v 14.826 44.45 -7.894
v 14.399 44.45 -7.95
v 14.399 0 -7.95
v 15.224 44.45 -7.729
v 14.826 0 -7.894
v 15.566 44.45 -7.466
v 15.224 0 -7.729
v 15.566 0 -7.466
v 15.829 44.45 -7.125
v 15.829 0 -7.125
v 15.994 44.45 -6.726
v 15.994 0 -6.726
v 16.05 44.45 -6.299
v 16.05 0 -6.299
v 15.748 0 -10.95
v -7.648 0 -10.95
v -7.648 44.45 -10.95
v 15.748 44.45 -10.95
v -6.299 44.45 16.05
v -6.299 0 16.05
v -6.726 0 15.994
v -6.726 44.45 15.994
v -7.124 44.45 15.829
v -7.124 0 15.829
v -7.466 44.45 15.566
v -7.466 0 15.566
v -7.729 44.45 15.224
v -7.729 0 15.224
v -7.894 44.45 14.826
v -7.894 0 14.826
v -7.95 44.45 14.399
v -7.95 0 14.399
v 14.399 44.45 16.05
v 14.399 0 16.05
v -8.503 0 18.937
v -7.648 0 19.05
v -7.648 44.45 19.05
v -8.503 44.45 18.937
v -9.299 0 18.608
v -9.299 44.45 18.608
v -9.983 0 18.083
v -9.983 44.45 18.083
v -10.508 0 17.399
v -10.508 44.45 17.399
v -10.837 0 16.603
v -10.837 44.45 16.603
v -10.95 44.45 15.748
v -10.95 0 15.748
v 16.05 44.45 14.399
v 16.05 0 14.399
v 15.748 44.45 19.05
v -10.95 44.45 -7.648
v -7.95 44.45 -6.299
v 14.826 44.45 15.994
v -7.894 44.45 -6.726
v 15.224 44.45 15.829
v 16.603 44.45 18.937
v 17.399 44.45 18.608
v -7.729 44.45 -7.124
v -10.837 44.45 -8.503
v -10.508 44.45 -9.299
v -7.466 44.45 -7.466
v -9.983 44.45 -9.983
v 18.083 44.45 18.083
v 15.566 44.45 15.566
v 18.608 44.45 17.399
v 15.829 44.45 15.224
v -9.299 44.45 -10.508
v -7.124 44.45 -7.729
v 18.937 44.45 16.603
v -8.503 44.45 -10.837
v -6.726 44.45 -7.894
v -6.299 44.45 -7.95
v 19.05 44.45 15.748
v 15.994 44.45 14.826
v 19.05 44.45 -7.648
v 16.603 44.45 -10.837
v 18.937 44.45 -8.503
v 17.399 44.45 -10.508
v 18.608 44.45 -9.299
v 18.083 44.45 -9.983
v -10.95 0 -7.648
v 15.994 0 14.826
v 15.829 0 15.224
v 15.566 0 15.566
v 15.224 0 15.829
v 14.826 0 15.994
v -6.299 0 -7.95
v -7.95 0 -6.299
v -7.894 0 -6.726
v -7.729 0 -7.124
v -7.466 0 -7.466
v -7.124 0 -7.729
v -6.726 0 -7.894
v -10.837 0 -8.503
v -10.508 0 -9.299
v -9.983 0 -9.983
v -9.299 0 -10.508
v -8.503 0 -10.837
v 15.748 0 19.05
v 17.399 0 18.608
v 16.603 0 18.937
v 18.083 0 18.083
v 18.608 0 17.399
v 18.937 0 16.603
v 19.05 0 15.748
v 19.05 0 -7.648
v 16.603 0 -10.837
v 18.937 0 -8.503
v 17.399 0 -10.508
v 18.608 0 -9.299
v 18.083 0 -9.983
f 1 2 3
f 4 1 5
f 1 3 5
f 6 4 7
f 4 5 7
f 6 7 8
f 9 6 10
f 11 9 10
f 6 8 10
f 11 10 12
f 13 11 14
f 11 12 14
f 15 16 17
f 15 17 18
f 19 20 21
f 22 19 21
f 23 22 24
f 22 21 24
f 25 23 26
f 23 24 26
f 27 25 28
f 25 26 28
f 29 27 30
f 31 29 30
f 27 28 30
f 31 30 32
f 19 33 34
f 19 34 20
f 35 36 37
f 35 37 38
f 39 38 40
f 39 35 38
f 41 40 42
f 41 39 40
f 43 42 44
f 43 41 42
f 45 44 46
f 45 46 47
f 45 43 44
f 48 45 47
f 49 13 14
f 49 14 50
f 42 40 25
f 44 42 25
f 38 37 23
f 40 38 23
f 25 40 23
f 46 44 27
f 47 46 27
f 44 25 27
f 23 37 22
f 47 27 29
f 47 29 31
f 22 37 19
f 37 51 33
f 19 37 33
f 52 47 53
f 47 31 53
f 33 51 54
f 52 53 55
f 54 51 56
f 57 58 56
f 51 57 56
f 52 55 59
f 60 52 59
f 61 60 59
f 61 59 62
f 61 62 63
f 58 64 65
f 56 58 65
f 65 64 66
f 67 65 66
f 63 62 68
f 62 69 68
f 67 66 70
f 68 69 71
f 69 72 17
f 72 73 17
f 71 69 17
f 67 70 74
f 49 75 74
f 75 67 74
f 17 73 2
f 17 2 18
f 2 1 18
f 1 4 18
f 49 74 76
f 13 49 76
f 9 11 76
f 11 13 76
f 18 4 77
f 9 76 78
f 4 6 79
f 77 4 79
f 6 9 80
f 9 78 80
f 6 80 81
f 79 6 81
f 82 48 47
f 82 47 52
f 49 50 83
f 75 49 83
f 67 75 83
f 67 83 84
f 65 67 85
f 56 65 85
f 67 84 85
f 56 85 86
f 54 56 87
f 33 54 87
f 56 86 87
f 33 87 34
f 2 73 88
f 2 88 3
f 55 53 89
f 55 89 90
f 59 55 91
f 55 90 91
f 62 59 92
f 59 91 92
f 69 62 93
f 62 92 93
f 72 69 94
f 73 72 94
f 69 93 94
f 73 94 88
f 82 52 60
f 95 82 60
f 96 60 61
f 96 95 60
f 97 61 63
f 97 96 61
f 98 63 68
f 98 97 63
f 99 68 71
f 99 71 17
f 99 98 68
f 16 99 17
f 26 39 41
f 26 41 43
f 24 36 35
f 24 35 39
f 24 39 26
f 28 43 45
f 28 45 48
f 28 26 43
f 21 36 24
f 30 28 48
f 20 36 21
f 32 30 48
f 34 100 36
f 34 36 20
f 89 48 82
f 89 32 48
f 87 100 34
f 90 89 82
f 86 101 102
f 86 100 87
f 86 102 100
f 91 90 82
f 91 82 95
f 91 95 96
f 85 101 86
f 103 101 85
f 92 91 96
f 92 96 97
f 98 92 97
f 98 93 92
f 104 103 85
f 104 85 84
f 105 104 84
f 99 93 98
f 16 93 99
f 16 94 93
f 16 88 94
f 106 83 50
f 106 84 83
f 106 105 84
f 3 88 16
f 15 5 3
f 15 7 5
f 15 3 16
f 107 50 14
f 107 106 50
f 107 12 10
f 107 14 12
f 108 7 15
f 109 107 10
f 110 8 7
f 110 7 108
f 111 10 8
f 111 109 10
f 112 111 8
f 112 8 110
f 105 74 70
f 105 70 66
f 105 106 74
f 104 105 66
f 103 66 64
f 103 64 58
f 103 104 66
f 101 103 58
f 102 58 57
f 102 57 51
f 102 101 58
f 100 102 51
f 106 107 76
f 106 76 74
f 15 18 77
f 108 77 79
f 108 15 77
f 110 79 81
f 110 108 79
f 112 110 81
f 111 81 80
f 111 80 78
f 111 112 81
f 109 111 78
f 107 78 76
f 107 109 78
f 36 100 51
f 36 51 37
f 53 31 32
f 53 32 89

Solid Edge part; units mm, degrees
sketch "Sketch1" plane through (0, 0, 0) normal (0, -1, 0) x (1, 0, 0)
  line L0 (-7.95, 14.399) -> (-7.95, -6.299)
  arc A0 (-7.95, -6.299) -> (-6.299, -7.95) centre (-6.299, -6.299) ccw
  line L1 (-6.299, -7.95) -> (14.399, -7.95)
  arc A1 (14.399, -7.95) -> (16.05, -6.299) centre (14.399, -6.299) ccw
  line L2 (16.05, -6.299) -> (16.05, 14.399)
  arc A2 (16.05, 14.399) -> (14.399, 16.05) centre (14.399, 14.399) ccw
  line L3 (14.399, 16.05) -> (-6.299, 16.05)
  arc A3 (-6.299, 16.05) -> (-7.95, 14.399) centre (-6.299, 14.399) ccw
  arc A4 (-10.95, -7.648) -> (-7.648, -10.95) centre (-7.648, -7.648) ccw
  line L4 (-7.648, -10.95) -> (15.748, -10.95)
  arc A5 (15.748, -10.95) -> (19.05, -7.648) centre (15.748, -7.648) ccw
  line L5 (19.05, -7.648) -> (19.05, 15.748)
  arc A6 (19.05, 15.748) -> (15.748, 19.05) centre (15.748, 15.748) ccw
  line L6 (15.748, 19.05) -> (-7.648, 19.05)
  arc A7 (-7.648, 19.05) -> (-10.95, 15.748) centre (-7.648, 15.748) ccw
  line L7 (-10.95, 15.748) -> (-10.95, -7.648)
  dimension "D1" = 3.302
  dimension "D2" = 1.651
  dimension "D3" = 30
  dimension "D4" = 30
  dimension "D5" = 3
  dimension "D6" = 3
  dimension "D7" = 3
  dimension "D8" = 3
extrude "Protrusion1" add sketch "Sketch1" against normal blind 44.45
properties material "Steel"
